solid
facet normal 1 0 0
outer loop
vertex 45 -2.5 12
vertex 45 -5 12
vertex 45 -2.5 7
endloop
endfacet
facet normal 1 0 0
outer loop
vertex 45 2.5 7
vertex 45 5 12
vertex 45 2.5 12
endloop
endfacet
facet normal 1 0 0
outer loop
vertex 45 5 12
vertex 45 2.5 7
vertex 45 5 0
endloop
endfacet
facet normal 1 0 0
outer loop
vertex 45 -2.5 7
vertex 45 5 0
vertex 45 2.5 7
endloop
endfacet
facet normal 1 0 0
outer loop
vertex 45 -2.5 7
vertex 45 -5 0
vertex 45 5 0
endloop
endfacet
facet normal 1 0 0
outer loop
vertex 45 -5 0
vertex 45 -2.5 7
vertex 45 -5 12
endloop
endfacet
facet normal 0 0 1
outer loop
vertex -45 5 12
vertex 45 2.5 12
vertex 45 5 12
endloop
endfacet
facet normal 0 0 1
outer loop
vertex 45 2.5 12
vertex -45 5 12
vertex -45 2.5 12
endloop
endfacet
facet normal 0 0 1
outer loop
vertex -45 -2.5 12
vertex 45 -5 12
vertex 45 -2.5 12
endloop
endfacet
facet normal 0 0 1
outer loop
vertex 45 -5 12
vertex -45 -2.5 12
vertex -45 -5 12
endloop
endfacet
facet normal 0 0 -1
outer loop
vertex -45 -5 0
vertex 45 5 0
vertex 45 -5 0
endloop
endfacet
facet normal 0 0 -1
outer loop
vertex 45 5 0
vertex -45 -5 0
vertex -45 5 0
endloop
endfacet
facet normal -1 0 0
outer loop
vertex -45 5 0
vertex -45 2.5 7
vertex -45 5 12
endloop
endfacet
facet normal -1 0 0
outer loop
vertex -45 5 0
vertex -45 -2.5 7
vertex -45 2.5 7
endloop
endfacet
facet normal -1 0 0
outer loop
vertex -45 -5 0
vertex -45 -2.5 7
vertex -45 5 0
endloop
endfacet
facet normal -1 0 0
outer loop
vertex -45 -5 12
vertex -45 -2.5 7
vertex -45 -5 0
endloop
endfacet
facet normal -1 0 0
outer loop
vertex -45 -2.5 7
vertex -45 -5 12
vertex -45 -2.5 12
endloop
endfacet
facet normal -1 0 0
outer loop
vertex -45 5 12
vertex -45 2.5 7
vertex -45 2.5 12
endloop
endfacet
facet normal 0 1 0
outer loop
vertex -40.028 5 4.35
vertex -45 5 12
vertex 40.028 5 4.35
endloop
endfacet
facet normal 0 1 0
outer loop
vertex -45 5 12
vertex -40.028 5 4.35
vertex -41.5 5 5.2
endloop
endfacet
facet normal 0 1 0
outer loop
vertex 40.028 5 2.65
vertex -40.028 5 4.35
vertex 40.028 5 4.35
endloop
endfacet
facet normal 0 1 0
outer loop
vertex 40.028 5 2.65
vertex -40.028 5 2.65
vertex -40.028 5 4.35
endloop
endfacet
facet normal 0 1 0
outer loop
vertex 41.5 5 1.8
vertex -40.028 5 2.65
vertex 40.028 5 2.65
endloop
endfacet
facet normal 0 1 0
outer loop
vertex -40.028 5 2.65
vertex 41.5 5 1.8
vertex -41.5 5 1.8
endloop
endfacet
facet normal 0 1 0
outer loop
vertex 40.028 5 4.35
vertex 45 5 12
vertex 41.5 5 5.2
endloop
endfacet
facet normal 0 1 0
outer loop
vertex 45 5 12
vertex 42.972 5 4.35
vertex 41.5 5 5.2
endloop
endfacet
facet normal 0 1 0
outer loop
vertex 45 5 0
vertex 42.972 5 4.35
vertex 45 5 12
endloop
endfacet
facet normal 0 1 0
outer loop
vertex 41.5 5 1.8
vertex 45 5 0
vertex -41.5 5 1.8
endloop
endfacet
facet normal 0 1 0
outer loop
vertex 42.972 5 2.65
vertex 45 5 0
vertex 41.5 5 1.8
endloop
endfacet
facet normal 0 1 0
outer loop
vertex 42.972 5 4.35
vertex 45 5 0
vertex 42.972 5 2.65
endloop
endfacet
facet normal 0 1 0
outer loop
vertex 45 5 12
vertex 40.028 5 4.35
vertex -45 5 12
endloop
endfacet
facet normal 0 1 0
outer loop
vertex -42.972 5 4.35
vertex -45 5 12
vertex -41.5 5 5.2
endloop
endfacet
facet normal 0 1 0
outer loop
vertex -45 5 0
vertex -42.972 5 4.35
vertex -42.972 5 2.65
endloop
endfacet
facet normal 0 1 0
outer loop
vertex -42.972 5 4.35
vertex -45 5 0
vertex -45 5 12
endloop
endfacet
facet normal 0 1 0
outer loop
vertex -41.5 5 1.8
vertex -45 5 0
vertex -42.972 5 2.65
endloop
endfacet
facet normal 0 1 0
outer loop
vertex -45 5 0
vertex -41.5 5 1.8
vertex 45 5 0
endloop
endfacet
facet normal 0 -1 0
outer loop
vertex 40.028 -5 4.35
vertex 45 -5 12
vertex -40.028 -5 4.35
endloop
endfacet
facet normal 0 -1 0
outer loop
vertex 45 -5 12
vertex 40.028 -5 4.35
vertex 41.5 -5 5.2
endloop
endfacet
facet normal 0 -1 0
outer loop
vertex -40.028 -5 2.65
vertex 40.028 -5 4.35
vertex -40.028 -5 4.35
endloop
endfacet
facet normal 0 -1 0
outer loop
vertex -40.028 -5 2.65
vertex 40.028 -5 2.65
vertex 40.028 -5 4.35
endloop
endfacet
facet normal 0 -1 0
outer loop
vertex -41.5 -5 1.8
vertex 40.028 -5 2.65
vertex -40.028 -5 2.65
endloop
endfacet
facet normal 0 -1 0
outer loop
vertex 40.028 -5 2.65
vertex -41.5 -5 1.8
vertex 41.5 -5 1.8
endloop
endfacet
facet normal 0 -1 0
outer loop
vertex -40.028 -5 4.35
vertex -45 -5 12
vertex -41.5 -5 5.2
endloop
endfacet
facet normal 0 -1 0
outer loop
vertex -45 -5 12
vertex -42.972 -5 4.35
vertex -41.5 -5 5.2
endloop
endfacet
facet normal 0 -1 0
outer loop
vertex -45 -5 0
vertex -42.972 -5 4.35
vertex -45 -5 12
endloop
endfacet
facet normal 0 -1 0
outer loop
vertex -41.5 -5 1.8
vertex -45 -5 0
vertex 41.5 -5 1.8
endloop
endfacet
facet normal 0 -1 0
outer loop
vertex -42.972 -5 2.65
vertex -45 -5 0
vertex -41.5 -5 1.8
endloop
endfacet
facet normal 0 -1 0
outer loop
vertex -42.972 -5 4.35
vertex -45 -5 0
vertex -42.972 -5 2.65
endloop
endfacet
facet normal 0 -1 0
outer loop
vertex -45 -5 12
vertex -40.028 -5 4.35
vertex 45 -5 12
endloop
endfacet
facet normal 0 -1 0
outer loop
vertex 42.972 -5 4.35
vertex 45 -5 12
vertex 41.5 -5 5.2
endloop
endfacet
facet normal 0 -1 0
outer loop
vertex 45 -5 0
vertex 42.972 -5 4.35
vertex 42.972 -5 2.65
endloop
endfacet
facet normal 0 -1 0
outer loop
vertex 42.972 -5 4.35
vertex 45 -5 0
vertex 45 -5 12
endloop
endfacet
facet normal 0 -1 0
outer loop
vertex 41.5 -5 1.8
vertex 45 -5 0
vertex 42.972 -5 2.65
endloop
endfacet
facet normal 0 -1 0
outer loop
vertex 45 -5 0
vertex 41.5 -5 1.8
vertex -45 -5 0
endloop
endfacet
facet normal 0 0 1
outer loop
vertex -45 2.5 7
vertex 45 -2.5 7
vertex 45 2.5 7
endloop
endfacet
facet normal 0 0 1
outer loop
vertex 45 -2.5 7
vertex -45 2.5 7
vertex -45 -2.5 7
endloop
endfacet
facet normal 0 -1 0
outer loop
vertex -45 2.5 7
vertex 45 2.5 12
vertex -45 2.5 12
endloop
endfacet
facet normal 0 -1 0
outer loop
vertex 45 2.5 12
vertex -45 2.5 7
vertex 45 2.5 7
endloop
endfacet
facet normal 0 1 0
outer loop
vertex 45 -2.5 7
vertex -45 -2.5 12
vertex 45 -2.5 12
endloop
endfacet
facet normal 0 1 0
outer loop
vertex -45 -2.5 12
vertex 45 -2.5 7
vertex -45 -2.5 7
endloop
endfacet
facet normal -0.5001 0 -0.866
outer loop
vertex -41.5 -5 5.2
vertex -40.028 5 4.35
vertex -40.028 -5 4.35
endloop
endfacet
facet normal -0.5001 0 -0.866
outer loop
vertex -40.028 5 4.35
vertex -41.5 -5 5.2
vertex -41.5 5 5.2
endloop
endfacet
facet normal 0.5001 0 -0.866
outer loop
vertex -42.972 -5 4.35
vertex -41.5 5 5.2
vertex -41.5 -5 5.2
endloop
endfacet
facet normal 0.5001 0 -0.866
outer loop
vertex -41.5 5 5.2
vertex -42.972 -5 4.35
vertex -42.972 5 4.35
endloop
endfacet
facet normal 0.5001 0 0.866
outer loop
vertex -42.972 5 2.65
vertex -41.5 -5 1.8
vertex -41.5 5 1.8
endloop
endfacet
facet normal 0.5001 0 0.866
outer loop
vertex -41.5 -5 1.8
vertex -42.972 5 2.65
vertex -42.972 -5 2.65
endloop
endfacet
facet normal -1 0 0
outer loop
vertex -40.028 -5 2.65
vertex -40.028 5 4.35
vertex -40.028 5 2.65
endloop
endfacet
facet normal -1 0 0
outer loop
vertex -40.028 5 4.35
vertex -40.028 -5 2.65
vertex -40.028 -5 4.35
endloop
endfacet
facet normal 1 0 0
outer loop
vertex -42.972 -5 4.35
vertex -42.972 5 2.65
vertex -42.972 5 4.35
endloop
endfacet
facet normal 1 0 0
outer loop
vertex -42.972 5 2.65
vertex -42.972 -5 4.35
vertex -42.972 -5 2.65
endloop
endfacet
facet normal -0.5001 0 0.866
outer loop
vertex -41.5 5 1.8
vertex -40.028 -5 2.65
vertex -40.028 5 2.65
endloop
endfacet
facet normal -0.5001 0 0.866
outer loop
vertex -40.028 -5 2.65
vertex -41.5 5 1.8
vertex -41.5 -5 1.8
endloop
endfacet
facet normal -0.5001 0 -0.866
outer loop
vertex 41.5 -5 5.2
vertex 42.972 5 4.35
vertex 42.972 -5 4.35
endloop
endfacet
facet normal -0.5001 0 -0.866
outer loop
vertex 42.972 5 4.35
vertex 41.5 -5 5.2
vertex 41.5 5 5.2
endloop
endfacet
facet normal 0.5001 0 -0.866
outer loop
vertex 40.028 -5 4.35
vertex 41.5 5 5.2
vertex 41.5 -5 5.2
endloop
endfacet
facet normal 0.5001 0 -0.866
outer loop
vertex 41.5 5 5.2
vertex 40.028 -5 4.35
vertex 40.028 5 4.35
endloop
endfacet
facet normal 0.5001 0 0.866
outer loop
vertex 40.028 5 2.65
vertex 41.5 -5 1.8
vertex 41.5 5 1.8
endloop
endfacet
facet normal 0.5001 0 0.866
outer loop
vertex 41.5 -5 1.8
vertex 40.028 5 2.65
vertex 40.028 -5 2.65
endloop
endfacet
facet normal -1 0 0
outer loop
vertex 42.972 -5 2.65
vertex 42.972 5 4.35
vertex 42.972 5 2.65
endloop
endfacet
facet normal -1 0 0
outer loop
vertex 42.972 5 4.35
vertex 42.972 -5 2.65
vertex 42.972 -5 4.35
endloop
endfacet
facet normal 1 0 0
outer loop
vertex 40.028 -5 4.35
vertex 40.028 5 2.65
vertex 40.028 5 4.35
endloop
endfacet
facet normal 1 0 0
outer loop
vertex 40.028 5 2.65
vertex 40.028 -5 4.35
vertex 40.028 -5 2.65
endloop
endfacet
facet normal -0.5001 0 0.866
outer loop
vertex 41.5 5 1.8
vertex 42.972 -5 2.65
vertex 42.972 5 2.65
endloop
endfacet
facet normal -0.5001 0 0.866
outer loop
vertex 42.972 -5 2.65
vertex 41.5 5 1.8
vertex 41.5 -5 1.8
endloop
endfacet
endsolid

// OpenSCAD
// file: constants.scad
/* sinusoid-plotter: A parametric sinusoid plotter made with OpenSCAD.
 * Copyright (C) 2013  Clayton G. Hobbs
 * 
 * This program is free software: you can redistribute it and/or modify
 * it under the terms of the GNU General Public License as published by
 * the Free Software Foundation, either version 3 of the License, or
 * (at your option) any later version.
 * 
 * This program is distributed in the hope that it will be useful,
 * but WITHOUT ANY WARRANTY; without even the implied warranty of
 * MERCHANTABILITY or FITNESS FOR A PARTICULAR PURPOSE.  See the
 * GNU General Public License for more details.
 * 
 * You should have received a copy of the GNU General Public License
 * along with this program.  If not, see <http://www.gnu.org/licenses/>.
 */

pi = 3.1415926535897932384626433832795;
// main file
/* sinusoid-plotter: A parametric sinusoid plotter made with OpenSCAD.
 * Copyright (C) 2013  Clayton G. Hobbs
 * 
 * This program is free software: you can redistribute it and/or modify
 * it under the terms of the GNU General Public License as published by
 * the Free Software Foundation, either version 3 of the License, or
 * (at your option) any later version.
 * 
 * This program is distributed in the hope that it will be useful,
 * but WITHOUT ANY WARRANTY; without even the implied warranty of
 * MERCHANTABILITY or FITNESS FOR A PARTICULAR PURPOSE.  See the
 * GNU General Public License for more details.
 * 
 * You should have received a copy of the GNU General Public License
 * along with this program.  If not, see <http://www.gnu.org/licenses/>.
 */

include <constants.scad>;

module channel(size, channel_depth, channel_width, mount_width, mount_radius)
{
	difference() {
		translate([-size[0]/2, -size[1]/2, 0])
		cube(size);

		translate([-size[0]/2 - 1, -channel_width/2, size[2] - channel_depth])
		cube([size[0] + 2, channel_width, channel_depth + 1]);

		translate([(mount_width - size[0])/2, 0, (size[2] - channel_depth)/2])
		rotate([90, 30, 0])
		cylinder(r = mount_radius, h = size[1] + 2, center=true);

		translate([(size[0] - mount_width)/2, 0, (size[2] - channel_depth)/2])
		rotate([90, 30, 0])
		cylinder(r = mount_radius, h = size[1] + 2, center=true);
	}
}

channel(size = [90, 10, 12], channel_depth = 5, channel_width = 5,
        mount_width = 7, mount_radius = 1.7);
